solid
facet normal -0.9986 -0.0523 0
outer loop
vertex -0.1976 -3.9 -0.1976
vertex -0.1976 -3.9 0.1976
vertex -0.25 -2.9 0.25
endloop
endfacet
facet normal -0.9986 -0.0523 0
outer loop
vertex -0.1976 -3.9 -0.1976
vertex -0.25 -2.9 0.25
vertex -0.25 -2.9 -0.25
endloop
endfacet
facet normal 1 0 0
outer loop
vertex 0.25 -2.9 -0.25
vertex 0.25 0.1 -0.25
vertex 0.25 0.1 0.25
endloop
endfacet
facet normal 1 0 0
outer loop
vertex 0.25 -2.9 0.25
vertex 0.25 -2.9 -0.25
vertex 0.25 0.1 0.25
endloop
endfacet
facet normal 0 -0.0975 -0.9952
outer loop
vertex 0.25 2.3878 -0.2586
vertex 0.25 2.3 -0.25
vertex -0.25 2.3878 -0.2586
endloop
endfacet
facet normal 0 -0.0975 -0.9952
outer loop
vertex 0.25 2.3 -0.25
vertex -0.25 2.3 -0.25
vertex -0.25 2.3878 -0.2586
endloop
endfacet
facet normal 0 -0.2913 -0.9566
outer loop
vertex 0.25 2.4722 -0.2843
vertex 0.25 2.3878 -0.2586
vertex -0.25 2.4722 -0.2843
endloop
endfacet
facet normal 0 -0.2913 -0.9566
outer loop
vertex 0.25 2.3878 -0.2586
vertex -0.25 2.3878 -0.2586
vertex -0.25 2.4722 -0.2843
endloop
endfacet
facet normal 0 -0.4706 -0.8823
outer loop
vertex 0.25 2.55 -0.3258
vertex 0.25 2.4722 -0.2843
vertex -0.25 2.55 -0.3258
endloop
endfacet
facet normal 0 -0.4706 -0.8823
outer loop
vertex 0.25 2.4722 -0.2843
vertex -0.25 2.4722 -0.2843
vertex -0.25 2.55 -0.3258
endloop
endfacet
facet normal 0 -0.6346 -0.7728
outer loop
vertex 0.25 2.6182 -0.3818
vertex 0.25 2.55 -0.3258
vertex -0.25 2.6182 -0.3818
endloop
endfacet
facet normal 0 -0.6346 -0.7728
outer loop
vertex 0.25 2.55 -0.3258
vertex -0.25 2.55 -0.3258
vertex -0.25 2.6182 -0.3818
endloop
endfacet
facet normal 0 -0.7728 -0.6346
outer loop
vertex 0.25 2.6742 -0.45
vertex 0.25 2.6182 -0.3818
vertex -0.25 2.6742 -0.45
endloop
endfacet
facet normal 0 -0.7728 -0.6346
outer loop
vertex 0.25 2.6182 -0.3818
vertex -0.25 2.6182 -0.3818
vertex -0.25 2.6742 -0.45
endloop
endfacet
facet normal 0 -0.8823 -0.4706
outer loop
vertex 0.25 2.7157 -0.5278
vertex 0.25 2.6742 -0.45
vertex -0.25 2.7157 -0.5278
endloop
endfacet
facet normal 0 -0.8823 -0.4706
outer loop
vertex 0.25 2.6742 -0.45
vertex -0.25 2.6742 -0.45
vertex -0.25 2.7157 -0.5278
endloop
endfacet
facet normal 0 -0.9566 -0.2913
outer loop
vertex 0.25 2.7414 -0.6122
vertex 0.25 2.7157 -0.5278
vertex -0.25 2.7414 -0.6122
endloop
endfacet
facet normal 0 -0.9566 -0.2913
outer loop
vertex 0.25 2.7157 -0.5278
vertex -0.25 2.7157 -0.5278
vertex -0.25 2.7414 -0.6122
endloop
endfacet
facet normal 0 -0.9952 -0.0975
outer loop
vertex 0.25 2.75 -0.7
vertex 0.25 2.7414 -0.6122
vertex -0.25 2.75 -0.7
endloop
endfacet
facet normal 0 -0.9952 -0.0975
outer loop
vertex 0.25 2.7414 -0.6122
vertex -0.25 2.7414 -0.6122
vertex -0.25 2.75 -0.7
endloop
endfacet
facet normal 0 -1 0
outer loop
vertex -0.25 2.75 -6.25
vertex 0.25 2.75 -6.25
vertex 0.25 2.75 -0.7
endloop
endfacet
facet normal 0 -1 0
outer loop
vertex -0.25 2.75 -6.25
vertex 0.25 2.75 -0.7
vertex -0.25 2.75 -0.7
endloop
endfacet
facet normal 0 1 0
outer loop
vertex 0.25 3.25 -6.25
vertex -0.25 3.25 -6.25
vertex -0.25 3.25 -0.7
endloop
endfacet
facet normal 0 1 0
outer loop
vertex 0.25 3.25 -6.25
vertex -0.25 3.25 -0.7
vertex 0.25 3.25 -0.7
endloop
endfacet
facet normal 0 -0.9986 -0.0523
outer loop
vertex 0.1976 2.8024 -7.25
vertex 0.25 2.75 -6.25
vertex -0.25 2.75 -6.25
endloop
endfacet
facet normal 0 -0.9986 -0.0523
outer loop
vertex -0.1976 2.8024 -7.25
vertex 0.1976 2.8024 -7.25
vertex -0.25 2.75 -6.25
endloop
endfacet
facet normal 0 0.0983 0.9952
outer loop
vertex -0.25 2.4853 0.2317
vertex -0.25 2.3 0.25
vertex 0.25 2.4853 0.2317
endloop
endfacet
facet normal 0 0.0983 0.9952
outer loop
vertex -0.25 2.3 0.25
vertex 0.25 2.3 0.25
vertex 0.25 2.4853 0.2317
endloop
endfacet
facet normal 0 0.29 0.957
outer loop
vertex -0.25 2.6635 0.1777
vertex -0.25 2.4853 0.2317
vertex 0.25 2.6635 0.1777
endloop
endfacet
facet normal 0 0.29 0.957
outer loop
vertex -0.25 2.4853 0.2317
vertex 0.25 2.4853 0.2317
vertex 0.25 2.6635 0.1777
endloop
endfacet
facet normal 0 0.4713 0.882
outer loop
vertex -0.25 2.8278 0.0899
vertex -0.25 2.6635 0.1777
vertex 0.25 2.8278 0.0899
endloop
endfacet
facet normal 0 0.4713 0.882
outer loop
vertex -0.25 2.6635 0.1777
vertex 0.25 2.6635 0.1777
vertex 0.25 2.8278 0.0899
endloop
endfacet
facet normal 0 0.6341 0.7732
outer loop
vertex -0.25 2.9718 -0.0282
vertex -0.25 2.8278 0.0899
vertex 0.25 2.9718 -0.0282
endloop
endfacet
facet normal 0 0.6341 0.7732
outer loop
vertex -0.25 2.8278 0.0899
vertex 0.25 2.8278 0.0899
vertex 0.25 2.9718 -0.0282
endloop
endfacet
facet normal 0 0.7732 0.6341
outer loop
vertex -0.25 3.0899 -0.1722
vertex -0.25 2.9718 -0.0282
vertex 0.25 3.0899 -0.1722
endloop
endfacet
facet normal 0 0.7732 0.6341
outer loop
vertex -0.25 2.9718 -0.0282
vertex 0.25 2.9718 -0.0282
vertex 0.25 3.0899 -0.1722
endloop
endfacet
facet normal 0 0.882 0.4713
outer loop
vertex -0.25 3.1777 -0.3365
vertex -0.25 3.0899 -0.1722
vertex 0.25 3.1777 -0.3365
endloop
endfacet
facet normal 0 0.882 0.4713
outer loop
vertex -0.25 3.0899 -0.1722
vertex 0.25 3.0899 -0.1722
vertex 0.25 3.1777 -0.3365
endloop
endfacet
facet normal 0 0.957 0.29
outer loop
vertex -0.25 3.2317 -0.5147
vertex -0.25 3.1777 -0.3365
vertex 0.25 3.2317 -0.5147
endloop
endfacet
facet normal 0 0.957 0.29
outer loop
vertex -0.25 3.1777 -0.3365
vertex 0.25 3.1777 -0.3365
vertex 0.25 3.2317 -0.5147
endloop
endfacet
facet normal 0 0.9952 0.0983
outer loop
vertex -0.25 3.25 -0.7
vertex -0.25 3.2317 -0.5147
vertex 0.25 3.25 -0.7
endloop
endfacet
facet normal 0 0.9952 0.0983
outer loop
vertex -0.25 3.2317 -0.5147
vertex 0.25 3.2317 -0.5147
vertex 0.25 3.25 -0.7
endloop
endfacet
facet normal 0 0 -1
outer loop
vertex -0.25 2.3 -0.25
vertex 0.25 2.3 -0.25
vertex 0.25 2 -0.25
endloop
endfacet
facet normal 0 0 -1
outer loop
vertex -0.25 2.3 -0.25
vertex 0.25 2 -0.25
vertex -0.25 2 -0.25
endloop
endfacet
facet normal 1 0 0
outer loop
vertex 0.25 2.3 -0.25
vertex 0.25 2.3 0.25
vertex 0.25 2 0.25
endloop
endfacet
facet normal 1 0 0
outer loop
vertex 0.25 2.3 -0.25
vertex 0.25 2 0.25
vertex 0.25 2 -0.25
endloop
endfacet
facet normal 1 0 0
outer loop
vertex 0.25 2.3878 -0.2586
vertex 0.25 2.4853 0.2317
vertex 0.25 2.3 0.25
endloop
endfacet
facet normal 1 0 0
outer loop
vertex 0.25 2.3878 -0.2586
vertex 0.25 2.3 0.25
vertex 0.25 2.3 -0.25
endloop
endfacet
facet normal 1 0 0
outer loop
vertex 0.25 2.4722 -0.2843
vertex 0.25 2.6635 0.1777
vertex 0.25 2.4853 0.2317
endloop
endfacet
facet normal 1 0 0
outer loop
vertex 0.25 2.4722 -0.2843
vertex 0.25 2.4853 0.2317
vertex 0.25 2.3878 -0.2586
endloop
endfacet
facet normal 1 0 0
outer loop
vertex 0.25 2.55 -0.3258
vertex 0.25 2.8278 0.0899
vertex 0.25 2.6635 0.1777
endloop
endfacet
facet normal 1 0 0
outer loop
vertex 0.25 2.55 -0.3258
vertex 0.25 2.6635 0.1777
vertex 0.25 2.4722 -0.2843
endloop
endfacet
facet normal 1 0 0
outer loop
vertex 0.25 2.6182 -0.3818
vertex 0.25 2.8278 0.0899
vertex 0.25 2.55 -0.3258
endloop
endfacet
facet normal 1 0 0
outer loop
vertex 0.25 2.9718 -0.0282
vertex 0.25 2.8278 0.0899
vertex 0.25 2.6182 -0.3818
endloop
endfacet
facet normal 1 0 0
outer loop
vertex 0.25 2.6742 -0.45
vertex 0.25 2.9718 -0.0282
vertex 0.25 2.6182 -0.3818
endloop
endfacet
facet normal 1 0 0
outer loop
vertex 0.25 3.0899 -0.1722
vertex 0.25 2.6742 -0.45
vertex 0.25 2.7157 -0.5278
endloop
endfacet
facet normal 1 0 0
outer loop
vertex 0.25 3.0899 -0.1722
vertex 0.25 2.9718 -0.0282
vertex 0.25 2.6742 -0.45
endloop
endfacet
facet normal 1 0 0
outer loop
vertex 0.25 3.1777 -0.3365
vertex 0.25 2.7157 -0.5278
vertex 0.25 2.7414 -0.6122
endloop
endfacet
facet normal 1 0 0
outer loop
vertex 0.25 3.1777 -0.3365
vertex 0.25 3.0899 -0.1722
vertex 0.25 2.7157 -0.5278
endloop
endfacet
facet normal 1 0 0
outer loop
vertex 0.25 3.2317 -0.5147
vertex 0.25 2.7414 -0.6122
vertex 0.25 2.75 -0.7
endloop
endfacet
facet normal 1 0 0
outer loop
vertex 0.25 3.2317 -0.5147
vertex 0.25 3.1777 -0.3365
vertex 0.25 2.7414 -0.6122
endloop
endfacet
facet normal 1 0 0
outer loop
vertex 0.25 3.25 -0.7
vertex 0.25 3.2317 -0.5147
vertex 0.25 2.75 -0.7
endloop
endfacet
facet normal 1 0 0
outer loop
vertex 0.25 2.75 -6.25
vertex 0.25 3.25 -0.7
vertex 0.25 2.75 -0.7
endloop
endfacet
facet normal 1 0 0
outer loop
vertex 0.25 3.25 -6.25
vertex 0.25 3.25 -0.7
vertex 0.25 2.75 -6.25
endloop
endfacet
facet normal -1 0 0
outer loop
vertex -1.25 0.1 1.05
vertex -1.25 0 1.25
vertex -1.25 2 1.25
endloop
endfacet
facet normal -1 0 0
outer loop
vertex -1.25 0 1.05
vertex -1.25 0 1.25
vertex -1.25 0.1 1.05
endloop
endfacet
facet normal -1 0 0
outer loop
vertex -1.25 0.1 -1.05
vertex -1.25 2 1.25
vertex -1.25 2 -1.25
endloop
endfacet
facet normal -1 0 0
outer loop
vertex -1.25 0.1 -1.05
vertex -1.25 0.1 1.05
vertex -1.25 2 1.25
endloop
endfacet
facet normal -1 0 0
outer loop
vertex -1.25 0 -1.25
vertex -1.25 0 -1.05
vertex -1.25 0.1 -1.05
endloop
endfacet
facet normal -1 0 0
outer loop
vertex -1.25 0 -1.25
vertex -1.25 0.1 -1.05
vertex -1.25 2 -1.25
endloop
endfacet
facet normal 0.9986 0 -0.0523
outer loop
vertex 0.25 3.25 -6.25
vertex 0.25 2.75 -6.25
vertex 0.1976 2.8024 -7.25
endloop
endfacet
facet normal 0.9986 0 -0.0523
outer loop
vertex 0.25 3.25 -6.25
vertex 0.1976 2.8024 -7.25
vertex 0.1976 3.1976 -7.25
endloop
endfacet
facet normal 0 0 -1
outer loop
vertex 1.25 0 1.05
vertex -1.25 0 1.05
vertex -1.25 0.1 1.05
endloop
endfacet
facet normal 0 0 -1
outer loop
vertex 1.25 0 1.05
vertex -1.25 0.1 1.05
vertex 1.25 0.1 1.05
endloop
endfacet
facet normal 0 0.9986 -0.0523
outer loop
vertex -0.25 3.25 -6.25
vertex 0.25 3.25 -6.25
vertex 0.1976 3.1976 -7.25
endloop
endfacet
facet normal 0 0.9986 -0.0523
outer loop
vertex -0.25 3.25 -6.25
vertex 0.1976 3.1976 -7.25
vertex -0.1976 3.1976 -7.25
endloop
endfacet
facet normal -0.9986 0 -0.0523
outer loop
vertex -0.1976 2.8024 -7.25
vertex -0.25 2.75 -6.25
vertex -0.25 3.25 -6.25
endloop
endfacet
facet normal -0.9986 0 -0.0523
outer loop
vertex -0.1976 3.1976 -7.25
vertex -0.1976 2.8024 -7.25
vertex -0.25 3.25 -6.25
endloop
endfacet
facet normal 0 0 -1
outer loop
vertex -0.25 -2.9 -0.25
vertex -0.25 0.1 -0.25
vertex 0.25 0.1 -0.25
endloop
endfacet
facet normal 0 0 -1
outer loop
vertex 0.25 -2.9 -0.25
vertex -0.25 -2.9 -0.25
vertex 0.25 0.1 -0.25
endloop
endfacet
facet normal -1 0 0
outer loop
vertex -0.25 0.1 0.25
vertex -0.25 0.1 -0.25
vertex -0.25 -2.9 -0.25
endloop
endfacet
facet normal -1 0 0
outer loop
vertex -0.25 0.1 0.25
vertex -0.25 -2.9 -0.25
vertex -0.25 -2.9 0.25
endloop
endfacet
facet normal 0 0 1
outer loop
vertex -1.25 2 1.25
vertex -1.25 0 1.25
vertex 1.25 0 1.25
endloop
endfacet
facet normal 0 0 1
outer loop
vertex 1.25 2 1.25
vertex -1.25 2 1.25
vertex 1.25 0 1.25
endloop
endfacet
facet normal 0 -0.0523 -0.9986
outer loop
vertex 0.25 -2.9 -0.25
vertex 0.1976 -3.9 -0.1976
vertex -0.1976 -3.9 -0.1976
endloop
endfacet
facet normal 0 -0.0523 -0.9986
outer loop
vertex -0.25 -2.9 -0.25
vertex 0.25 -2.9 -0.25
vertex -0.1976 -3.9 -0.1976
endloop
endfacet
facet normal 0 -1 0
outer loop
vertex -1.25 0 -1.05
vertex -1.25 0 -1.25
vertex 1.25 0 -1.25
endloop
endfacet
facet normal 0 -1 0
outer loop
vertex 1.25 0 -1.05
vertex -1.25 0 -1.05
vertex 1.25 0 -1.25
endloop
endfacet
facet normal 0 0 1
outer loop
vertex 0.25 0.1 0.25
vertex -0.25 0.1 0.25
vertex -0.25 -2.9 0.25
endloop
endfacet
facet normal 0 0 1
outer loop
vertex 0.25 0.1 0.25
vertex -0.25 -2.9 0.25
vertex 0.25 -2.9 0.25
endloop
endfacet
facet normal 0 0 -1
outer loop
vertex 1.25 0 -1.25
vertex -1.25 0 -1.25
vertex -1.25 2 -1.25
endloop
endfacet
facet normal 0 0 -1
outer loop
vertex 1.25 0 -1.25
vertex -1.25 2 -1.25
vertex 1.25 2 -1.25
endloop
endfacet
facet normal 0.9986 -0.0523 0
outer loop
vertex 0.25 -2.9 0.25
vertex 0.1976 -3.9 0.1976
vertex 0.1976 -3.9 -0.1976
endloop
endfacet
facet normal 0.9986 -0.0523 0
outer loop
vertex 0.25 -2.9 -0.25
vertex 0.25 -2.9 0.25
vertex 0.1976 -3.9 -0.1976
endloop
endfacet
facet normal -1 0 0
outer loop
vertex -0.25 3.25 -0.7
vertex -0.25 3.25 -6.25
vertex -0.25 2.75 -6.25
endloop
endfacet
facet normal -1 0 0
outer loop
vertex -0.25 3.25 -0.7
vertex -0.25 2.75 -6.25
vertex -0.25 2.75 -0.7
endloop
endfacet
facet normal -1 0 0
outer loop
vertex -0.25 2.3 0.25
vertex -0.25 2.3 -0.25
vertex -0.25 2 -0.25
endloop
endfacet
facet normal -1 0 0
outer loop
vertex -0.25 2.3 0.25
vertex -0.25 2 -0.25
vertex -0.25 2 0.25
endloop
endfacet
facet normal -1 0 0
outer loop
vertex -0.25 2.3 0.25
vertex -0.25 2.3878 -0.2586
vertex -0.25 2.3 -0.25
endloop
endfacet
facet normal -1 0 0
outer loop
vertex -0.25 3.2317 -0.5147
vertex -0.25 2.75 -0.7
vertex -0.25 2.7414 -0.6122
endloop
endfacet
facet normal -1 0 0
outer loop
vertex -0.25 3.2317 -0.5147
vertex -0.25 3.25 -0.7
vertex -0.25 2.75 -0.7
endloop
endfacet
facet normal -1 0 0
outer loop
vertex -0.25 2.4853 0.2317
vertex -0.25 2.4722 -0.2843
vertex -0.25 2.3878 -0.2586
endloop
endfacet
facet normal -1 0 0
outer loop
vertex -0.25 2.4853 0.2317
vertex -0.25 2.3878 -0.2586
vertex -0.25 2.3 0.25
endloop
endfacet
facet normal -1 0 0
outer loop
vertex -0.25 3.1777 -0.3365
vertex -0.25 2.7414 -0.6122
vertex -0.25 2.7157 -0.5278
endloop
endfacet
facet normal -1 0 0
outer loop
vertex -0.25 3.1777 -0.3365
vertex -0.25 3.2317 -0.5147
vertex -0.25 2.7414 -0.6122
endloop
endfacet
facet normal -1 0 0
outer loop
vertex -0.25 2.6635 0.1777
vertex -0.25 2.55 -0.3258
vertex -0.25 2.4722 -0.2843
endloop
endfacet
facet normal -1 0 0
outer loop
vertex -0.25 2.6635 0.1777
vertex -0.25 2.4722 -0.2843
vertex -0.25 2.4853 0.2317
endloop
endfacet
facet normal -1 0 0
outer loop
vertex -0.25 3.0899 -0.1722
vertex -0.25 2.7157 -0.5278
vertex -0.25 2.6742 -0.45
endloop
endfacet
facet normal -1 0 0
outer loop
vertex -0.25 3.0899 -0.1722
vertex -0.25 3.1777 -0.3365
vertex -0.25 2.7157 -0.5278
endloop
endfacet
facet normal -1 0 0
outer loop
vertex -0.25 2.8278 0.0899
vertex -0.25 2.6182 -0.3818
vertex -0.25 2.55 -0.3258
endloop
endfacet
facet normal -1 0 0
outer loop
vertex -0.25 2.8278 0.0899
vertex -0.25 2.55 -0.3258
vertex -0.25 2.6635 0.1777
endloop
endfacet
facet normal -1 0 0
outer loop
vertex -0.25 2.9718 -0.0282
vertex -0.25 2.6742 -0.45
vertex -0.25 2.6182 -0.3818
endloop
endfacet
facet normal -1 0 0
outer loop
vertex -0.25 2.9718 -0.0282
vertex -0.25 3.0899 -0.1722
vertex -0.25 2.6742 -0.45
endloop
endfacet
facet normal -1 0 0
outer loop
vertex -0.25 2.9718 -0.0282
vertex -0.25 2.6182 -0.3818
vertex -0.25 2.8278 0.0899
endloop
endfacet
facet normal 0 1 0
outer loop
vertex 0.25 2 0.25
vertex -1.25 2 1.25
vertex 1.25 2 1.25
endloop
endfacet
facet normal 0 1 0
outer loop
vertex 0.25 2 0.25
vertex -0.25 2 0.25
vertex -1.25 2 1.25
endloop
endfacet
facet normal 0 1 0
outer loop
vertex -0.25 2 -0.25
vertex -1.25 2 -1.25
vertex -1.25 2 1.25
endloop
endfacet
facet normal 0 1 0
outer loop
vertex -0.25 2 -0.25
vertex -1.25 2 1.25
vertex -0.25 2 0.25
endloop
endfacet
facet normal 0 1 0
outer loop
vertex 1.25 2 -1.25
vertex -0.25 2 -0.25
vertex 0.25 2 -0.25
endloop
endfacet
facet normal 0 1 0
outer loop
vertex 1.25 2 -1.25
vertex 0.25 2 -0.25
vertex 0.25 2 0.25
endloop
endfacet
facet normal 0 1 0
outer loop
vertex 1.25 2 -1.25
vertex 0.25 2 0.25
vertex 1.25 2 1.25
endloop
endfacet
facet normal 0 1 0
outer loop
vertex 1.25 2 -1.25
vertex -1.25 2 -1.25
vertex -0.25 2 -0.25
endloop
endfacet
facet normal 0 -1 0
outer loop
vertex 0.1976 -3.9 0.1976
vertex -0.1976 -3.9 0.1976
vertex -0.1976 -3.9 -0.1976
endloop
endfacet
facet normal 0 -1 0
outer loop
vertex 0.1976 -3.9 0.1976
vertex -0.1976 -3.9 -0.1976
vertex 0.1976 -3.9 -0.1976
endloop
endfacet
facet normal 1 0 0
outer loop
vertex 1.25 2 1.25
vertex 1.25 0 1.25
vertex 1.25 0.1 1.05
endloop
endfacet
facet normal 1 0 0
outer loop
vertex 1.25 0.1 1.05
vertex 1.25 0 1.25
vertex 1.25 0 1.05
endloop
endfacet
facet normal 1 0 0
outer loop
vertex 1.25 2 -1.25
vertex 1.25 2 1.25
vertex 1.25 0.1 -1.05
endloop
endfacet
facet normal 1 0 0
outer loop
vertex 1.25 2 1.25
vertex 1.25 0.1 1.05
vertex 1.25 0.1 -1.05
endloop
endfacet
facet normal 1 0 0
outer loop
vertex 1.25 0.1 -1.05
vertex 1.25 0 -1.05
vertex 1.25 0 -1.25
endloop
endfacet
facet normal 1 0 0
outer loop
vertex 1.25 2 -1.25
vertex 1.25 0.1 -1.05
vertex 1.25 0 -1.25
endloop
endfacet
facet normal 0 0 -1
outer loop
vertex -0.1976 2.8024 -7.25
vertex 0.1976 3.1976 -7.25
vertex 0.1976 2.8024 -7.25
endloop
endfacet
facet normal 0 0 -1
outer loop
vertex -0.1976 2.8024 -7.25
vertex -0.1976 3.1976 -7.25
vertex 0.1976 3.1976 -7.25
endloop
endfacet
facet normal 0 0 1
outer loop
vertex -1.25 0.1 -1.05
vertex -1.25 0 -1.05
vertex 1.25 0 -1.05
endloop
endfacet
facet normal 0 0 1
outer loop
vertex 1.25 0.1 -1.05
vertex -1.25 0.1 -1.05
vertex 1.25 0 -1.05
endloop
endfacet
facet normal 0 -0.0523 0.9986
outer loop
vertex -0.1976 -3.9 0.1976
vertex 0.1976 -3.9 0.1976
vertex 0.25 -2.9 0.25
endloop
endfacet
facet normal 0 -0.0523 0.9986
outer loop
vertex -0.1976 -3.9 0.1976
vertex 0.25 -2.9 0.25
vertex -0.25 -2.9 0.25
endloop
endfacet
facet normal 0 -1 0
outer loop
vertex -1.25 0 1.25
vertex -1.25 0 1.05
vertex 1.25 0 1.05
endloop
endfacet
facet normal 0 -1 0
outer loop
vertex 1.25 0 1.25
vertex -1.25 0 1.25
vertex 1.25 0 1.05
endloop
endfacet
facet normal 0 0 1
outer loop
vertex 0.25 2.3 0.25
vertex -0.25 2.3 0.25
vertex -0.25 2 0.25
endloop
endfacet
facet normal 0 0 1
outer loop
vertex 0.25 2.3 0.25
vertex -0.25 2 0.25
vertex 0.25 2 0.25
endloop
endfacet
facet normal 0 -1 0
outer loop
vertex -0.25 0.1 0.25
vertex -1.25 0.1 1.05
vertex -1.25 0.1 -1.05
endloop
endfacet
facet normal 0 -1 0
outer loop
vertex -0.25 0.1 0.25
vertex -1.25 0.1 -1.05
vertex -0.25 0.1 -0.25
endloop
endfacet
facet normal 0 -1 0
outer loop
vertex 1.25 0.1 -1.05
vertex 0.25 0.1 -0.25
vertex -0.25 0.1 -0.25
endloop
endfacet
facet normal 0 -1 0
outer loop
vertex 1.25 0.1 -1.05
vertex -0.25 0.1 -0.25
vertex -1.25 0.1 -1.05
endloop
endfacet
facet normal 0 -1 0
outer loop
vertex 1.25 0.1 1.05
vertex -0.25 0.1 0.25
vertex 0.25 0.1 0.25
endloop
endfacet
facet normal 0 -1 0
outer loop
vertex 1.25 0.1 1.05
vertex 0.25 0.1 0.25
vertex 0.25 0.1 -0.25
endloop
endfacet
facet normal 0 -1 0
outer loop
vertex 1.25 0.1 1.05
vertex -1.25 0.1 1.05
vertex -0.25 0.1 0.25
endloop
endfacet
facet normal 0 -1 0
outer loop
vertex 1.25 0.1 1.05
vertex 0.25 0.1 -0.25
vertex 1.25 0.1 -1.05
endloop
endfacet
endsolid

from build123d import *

# Parameters (mm, degrees)
CROQUIS1_W              = 2.5
CROQUIS1_H              = 2.5
SALIENTE_EXTRUIR1_DEPTH = 2
CROQUIS2_W              = 2.5
CROQUIS2_H              = 2.1
CORTAR_EXTRUIR1_DEPTH   = 0.1
CROQUIS3_W              = 0.5
CROQUIS3_H              = 0.5
SALIENTE_EXTRUIR2_DEPTH = 4
CROQUIS5_OUTSIDE_W      = 5.98
CROQUIS5_OUTSIDE_H      = 5.98
CROQUIS5_OUTSIDE_W_2    = 0.5
CROQUIS5_OUTSIDE_H_2    = 0.5
CORTAR_EXTRUIR2_DEPTH   = 1
CORTAR_EXTRUIR2_DRAFT   = -3
CROQUIS6_W              = 0.5
CROQUIS6_H              = 0.5
CROQUIS8_OUTSIDE_W      = 6.882
CROQUIS8_OUTSIDE_H      = 11.532
CROQUIS8_OUTSIDE_W_2    = 0.5
CROQUIS8_OUTSIDE_H_2    = 0.5
CORTAR_EXTRUIR3_DEPTH   = 1
CORTAR_EXTRUIR3_DRAFT   = -3


with BuildPart() as part:
    # Croquis1 → Saliente-Extruir1 (new body)
    with BuildSketch(Plane(origin=(0, 0, 0), x_dir=(1, 0, 0), z_dir=(0, 1, 0))):
        Rectangle(CROQUIS1_W, CROQUIS1_H)
    extrude(amount=SALIENTE_EXTRUIR1_DEPTH)

    # Croquis2 → Cortar-Extruir1 (cut)
    with BuildSketch(Plane.XZ):
        Rectangle(CROQUIS2_W, CROQUIS2_H)
    extrude(amount=-CORTAR_EXTRUIR1_DEPTH, mode=Mode.SUBTRACT)

    # Croquis3 → Saliente-Extruir2 (add)
    with BuildSketch(Plane.XZ.offset(-0.1)):
        Rectangle(CROQUIS3_W, CROQUIS3_H)
    extrude(amount=SALIENTE_EXTRUIR2_DEPTH)


with BuildPart() as cortar_extruir2_tool:
    # Croquis5 outside → Cortar-Extruir2 (with draft: the straight prism first)
    with BuildSketch(Plane(origin=(0, -2.9, 0), x_dir=(-1, 0, 0), z_dir=(0, -1, 0))):
        Rectangle(CROQUIS5_OUTSIDE_W, CROQUIS5_OUTSIDE_H)
        Rectangle(CROQUIS5_OUTSIDE_W_2, CROQUIS5_OUTSIDE_H_2, mode=Mode.SUBTRACT)
    extrude(amount=CORTAR_EXTRUIR2_DEPTH)
    # Cortar-Extruir2: the draft: its side faces are tilted about the plane it starts from
    cortar_extruir2_sides = [cortar_extruir2_tool.faces().sort_by_distance(p)[0] for p in [
        (0, -3.4, 2.99),
        (-2.99, -3.4, 0),
        (0, -3.4, -2.99),
        (2.99, -3.4, 0),
        (0, -3.4, -0.25),
        (-0.25, -3.4, 0),
        (0, -3.4, 0.25),
        (0.25, -3.4, 0),
    ]]
    draft(cortar_extruir2_sides, Plane(origin=(0, -2.9, 0), x_dir=(-1, 0, 0), z_dir=(0, -1, 0)), CORTAR_EXTRUIR2_DRAFT)


with BuildPart() as part_1:
    add(part.part)

    # Cortar-Extruir2: cut by cortar_extruir2_tool
    add(cortar_extruir2_tool.part, mode=Mode.SUBTRACT)

    # Barrer1: sweep along a path in Croquis7
    with BuildLine(Plane(origin=(0, 0, 0), x_dir=(0, 0, -1), z_dir=(1, 0, 0))) as barrer1_path:
        Line((0, 2), (0, 2.3))
        ThreePointArc((0, 2.3), (0.205025253, 2.794974747), (0.7, 3))
        Line((0.7, 3), (7.25, 3))
    # Croquis6 → Barrer1 (sweep)
    with BuildSketch(Plane(origin=(0, 2, 0), x_dir=(1, 0, 0), z_dir=(0, 1, 0))):
        Rectangle(CROQUIS6_W, CROQUIS6_H)
    sweep(path=barrer1_path.line)


with BuildPart() as cortar_extruir3_tool:
    # Croquis8 outside → Cortar-Extruir3 (with draft: the straight prism first)
    with BuildSketch(Plane(origin=(0, 0, -6.25), x_dir=(-1, 0, 0), z_dir=(0, 0, -1))):
        with Locations((0, -0.325)):
            Rectangle(CROQUIS8_OUTSIDE_W, CROQUIS8_OUTSIDE_H)
        with Locations((0, 3)):
            Rectangle(CROQUIS8_OUTSIDE_W_2, CROQUIS8_OUTSIDE_H_2, mode=Mode.SUBTRACT)
    extrude(amount=CORTAR_EXTRUIR3_DEPTH)
    # Cortar-Extruir3: the draft: its side faces are tilted about the plane it starts from
    cortar_extruir3_sides = [cortar_extruir3_tool.faces().sort_by_distance(p)[0] for p in [
        (0, -6.091, -6.75),
        (-3.441, -0.325, -6.75),
        (0, 5.441, -6.75),
        (3.441, -0.325, -6.75),
        (0, 2.75, -6.75),
        (0.25, 3, -6.75),
        (0, 3.25, -6.75),
        (-0.25, 3, -6.75),
    ]]
    draft(cortar_extruir3_sides, Plane(origin=(0, 0, -6.25), x_dir=(-1, 0, 0), z_dir=(0, 0, -1)), CORTAR_EXTRUIR3_DRAFT)


with BuildPart() as part_2:
    add(part_1.part)

    # Cortar-Extruir3: cut by cortar_extruir3_tool
    add(cortar_extruir3_tool.part, mode=Mode.SUBTRACT)


solid = part_2.part
